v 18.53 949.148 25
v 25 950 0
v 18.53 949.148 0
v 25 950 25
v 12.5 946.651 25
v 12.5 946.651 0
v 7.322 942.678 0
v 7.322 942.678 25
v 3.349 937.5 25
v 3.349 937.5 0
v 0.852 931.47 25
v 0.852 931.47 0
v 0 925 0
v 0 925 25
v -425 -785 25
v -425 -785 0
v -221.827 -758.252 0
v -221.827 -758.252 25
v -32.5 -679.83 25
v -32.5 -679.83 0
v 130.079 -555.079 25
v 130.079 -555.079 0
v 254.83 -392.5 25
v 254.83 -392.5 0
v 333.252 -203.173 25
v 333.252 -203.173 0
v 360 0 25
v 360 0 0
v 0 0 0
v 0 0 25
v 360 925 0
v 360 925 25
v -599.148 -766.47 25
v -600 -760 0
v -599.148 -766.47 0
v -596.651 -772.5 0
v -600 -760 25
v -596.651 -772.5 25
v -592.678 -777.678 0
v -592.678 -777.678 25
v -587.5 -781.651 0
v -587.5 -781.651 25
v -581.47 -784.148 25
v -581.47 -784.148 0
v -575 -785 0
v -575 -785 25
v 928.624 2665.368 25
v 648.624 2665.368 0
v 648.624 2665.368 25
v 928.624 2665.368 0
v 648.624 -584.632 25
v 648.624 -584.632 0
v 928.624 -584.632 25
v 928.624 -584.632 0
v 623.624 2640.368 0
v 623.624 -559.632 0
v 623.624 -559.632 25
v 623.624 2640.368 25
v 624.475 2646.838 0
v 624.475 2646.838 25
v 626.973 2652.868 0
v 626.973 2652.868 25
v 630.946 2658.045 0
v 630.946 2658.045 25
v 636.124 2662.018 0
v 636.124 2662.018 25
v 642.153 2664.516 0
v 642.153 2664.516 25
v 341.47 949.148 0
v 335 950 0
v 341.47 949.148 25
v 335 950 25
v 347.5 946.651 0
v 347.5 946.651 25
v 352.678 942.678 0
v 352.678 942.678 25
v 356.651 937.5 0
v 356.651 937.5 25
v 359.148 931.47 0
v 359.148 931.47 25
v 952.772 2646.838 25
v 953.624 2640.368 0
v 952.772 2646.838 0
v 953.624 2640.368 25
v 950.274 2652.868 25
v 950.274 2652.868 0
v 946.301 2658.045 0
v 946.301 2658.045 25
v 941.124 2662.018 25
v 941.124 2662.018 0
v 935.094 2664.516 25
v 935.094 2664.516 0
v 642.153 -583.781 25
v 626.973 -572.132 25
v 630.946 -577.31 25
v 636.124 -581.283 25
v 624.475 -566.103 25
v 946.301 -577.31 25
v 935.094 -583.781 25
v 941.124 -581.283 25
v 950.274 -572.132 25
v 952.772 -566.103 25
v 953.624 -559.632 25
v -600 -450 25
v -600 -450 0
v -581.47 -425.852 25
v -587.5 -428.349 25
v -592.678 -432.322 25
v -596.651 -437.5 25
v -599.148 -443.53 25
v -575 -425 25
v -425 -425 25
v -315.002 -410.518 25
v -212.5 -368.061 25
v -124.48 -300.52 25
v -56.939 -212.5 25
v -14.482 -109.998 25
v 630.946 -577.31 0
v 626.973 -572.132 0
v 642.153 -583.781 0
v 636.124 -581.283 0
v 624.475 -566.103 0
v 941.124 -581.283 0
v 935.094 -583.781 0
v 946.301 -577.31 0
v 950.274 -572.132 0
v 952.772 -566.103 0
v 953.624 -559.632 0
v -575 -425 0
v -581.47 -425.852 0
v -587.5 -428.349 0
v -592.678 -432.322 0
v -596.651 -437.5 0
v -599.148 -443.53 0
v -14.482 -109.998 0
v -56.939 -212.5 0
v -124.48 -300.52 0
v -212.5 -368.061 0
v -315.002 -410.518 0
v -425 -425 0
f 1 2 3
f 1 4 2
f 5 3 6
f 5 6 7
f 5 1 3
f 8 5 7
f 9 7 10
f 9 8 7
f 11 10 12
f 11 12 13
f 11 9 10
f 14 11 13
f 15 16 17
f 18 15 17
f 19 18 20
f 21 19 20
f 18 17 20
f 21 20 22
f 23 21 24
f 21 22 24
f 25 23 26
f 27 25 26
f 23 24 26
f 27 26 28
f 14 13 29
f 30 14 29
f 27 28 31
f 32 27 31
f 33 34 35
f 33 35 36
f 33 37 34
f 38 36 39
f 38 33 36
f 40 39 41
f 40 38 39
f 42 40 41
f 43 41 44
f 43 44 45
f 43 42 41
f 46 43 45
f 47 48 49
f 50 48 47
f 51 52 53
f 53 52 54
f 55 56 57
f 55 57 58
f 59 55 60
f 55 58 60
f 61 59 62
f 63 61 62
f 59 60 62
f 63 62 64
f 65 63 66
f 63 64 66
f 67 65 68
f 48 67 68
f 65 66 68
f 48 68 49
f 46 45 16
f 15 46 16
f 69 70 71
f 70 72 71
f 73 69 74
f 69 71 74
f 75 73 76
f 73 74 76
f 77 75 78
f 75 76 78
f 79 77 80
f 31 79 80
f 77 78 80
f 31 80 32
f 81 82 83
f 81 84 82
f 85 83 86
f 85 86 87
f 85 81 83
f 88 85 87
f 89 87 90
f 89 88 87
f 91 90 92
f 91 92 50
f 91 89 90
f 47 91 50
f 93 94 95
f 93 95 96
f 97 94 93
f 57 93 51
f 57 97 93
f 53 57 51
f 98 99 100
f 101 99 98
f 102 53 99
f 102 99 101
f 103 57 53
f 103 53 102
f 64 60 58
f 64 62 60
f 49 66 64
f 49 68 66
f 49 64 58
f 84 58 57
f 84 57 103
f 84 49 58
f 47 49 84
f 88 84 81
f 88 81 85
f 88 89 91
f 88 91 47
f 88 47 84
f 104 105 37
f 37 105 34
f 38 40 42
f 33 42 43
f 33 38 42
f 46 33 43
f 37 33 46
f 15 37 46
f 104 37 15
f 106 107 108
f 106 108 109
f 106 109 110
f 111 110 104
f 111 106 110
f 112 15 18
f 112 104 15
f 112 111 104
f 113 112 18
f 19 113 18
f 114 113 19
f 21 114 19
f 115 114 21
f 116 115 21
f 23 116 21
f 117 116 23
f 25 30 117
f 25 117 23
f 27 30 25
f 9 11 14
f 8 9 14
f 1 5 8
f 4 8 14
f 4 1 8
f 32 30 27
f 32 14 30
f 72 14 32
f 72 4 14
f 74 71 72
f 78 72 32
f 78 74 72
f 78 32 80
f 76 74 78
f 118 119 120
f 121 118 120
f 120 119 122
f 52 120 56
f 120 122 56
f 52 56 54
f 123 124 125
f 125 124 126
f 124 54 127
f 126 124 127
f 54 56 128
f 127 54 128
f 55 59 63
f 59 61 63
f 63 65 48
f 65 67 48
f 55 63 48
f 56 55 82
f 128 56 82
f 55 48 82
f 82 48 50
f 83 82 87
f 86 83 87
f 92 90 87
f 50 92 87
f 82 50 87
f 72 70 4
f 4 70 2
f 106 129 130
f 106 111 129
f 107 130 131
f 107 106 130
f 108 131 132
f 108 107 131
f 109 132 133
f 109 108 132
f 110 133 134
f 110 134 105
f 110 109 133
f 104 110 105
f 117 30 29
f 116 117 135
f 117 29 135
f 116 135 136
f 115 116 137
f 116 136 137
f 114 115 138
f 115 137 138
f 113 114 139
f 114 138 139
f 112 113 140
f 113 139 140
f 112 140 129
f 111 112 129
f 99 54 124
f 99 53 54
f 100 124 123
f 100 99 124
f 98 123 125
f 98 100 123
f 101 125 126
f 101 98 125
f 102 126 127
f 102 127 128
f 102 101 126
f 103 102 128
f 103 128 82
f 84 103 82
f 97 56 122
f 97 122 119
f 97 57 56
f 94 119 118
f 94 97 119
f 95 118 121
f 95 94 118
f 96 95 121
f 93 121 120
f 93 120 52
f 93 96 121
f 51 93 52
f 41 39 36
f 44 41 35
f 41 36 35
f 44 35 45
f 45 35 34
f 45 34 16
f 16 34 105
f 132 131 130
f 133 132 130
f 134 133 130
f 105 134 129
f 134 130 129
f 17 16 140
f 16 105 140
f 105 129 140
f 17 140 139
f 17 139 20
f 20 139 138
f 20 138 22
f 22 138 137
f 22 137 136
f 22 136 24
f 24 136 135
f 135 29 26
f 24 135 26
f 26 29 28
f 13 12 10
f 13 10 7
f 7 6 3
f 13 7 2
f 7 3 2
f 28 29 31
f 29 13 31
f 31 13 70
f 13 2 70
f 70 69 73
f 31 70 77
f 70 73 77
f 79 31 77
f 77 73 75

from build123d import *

# Parameters (mm, degrees)
F1_DEPTH = 25
F2_R     = 25
F3_W     = 330
F3_H     = 3250
F4_DEPTH = 25
F5_R     = 25


with BuildPart() as f1:
    # F0 (on Top) → F1 (new body)
    with BuildSketch(Plane.XY):
        with BuildLine():
            Line((360, 950), (0, 950))
            Line((0, 950), (0, 0))
            ThreePointArc((0, 0), (-124.479618, -300.520382), (-425, -425))
            Line((-425, -425), (-600, -425))
            Line((-600, -425), (-600, -785))
            Line((-600, -785), (-425, -785))
            ThreePointArc((-425, -785), (130.078823, -555.078823), (360, 0))
            Line((360, 0), (360, 950))
        make_face()
    extrude(amount=F1_DEPTH)

    # F2
    f2_edges = [f1.edges().sort_by_distance(p)[0] for p in [
        (0, 950, 12.5),
        (360, 950, 12.5),
        (-600, -785, 12.5),
        (-600, -425, 12.5),
    ]]
    fillet(f2_edges, radius=F2_R)


with BuildPart() as f4:
    # F3 (on Top) → F4 (new body)
    with BuildSketch(Plane.XY):
        with Locations((788.623571, 1040.367525)):
            Rectangle(F3_W, F3_H)
    extrude(amount=F4_DEPTH)

    # F5
    f5_edges = [f4.edges().sort_by_distance(p)[0] for p in [
        (623.623571, 2665.367525, 12.5),
        (953.623571, 2665.367525, 12.5),
        (953.623571, -584.632475, 12.5),
        (623.623571, -584.632475, 12.5),
    ]]
    fillet(f5_edges, radius=F5_R)


solid = Compound([f1.part, f4.part])
